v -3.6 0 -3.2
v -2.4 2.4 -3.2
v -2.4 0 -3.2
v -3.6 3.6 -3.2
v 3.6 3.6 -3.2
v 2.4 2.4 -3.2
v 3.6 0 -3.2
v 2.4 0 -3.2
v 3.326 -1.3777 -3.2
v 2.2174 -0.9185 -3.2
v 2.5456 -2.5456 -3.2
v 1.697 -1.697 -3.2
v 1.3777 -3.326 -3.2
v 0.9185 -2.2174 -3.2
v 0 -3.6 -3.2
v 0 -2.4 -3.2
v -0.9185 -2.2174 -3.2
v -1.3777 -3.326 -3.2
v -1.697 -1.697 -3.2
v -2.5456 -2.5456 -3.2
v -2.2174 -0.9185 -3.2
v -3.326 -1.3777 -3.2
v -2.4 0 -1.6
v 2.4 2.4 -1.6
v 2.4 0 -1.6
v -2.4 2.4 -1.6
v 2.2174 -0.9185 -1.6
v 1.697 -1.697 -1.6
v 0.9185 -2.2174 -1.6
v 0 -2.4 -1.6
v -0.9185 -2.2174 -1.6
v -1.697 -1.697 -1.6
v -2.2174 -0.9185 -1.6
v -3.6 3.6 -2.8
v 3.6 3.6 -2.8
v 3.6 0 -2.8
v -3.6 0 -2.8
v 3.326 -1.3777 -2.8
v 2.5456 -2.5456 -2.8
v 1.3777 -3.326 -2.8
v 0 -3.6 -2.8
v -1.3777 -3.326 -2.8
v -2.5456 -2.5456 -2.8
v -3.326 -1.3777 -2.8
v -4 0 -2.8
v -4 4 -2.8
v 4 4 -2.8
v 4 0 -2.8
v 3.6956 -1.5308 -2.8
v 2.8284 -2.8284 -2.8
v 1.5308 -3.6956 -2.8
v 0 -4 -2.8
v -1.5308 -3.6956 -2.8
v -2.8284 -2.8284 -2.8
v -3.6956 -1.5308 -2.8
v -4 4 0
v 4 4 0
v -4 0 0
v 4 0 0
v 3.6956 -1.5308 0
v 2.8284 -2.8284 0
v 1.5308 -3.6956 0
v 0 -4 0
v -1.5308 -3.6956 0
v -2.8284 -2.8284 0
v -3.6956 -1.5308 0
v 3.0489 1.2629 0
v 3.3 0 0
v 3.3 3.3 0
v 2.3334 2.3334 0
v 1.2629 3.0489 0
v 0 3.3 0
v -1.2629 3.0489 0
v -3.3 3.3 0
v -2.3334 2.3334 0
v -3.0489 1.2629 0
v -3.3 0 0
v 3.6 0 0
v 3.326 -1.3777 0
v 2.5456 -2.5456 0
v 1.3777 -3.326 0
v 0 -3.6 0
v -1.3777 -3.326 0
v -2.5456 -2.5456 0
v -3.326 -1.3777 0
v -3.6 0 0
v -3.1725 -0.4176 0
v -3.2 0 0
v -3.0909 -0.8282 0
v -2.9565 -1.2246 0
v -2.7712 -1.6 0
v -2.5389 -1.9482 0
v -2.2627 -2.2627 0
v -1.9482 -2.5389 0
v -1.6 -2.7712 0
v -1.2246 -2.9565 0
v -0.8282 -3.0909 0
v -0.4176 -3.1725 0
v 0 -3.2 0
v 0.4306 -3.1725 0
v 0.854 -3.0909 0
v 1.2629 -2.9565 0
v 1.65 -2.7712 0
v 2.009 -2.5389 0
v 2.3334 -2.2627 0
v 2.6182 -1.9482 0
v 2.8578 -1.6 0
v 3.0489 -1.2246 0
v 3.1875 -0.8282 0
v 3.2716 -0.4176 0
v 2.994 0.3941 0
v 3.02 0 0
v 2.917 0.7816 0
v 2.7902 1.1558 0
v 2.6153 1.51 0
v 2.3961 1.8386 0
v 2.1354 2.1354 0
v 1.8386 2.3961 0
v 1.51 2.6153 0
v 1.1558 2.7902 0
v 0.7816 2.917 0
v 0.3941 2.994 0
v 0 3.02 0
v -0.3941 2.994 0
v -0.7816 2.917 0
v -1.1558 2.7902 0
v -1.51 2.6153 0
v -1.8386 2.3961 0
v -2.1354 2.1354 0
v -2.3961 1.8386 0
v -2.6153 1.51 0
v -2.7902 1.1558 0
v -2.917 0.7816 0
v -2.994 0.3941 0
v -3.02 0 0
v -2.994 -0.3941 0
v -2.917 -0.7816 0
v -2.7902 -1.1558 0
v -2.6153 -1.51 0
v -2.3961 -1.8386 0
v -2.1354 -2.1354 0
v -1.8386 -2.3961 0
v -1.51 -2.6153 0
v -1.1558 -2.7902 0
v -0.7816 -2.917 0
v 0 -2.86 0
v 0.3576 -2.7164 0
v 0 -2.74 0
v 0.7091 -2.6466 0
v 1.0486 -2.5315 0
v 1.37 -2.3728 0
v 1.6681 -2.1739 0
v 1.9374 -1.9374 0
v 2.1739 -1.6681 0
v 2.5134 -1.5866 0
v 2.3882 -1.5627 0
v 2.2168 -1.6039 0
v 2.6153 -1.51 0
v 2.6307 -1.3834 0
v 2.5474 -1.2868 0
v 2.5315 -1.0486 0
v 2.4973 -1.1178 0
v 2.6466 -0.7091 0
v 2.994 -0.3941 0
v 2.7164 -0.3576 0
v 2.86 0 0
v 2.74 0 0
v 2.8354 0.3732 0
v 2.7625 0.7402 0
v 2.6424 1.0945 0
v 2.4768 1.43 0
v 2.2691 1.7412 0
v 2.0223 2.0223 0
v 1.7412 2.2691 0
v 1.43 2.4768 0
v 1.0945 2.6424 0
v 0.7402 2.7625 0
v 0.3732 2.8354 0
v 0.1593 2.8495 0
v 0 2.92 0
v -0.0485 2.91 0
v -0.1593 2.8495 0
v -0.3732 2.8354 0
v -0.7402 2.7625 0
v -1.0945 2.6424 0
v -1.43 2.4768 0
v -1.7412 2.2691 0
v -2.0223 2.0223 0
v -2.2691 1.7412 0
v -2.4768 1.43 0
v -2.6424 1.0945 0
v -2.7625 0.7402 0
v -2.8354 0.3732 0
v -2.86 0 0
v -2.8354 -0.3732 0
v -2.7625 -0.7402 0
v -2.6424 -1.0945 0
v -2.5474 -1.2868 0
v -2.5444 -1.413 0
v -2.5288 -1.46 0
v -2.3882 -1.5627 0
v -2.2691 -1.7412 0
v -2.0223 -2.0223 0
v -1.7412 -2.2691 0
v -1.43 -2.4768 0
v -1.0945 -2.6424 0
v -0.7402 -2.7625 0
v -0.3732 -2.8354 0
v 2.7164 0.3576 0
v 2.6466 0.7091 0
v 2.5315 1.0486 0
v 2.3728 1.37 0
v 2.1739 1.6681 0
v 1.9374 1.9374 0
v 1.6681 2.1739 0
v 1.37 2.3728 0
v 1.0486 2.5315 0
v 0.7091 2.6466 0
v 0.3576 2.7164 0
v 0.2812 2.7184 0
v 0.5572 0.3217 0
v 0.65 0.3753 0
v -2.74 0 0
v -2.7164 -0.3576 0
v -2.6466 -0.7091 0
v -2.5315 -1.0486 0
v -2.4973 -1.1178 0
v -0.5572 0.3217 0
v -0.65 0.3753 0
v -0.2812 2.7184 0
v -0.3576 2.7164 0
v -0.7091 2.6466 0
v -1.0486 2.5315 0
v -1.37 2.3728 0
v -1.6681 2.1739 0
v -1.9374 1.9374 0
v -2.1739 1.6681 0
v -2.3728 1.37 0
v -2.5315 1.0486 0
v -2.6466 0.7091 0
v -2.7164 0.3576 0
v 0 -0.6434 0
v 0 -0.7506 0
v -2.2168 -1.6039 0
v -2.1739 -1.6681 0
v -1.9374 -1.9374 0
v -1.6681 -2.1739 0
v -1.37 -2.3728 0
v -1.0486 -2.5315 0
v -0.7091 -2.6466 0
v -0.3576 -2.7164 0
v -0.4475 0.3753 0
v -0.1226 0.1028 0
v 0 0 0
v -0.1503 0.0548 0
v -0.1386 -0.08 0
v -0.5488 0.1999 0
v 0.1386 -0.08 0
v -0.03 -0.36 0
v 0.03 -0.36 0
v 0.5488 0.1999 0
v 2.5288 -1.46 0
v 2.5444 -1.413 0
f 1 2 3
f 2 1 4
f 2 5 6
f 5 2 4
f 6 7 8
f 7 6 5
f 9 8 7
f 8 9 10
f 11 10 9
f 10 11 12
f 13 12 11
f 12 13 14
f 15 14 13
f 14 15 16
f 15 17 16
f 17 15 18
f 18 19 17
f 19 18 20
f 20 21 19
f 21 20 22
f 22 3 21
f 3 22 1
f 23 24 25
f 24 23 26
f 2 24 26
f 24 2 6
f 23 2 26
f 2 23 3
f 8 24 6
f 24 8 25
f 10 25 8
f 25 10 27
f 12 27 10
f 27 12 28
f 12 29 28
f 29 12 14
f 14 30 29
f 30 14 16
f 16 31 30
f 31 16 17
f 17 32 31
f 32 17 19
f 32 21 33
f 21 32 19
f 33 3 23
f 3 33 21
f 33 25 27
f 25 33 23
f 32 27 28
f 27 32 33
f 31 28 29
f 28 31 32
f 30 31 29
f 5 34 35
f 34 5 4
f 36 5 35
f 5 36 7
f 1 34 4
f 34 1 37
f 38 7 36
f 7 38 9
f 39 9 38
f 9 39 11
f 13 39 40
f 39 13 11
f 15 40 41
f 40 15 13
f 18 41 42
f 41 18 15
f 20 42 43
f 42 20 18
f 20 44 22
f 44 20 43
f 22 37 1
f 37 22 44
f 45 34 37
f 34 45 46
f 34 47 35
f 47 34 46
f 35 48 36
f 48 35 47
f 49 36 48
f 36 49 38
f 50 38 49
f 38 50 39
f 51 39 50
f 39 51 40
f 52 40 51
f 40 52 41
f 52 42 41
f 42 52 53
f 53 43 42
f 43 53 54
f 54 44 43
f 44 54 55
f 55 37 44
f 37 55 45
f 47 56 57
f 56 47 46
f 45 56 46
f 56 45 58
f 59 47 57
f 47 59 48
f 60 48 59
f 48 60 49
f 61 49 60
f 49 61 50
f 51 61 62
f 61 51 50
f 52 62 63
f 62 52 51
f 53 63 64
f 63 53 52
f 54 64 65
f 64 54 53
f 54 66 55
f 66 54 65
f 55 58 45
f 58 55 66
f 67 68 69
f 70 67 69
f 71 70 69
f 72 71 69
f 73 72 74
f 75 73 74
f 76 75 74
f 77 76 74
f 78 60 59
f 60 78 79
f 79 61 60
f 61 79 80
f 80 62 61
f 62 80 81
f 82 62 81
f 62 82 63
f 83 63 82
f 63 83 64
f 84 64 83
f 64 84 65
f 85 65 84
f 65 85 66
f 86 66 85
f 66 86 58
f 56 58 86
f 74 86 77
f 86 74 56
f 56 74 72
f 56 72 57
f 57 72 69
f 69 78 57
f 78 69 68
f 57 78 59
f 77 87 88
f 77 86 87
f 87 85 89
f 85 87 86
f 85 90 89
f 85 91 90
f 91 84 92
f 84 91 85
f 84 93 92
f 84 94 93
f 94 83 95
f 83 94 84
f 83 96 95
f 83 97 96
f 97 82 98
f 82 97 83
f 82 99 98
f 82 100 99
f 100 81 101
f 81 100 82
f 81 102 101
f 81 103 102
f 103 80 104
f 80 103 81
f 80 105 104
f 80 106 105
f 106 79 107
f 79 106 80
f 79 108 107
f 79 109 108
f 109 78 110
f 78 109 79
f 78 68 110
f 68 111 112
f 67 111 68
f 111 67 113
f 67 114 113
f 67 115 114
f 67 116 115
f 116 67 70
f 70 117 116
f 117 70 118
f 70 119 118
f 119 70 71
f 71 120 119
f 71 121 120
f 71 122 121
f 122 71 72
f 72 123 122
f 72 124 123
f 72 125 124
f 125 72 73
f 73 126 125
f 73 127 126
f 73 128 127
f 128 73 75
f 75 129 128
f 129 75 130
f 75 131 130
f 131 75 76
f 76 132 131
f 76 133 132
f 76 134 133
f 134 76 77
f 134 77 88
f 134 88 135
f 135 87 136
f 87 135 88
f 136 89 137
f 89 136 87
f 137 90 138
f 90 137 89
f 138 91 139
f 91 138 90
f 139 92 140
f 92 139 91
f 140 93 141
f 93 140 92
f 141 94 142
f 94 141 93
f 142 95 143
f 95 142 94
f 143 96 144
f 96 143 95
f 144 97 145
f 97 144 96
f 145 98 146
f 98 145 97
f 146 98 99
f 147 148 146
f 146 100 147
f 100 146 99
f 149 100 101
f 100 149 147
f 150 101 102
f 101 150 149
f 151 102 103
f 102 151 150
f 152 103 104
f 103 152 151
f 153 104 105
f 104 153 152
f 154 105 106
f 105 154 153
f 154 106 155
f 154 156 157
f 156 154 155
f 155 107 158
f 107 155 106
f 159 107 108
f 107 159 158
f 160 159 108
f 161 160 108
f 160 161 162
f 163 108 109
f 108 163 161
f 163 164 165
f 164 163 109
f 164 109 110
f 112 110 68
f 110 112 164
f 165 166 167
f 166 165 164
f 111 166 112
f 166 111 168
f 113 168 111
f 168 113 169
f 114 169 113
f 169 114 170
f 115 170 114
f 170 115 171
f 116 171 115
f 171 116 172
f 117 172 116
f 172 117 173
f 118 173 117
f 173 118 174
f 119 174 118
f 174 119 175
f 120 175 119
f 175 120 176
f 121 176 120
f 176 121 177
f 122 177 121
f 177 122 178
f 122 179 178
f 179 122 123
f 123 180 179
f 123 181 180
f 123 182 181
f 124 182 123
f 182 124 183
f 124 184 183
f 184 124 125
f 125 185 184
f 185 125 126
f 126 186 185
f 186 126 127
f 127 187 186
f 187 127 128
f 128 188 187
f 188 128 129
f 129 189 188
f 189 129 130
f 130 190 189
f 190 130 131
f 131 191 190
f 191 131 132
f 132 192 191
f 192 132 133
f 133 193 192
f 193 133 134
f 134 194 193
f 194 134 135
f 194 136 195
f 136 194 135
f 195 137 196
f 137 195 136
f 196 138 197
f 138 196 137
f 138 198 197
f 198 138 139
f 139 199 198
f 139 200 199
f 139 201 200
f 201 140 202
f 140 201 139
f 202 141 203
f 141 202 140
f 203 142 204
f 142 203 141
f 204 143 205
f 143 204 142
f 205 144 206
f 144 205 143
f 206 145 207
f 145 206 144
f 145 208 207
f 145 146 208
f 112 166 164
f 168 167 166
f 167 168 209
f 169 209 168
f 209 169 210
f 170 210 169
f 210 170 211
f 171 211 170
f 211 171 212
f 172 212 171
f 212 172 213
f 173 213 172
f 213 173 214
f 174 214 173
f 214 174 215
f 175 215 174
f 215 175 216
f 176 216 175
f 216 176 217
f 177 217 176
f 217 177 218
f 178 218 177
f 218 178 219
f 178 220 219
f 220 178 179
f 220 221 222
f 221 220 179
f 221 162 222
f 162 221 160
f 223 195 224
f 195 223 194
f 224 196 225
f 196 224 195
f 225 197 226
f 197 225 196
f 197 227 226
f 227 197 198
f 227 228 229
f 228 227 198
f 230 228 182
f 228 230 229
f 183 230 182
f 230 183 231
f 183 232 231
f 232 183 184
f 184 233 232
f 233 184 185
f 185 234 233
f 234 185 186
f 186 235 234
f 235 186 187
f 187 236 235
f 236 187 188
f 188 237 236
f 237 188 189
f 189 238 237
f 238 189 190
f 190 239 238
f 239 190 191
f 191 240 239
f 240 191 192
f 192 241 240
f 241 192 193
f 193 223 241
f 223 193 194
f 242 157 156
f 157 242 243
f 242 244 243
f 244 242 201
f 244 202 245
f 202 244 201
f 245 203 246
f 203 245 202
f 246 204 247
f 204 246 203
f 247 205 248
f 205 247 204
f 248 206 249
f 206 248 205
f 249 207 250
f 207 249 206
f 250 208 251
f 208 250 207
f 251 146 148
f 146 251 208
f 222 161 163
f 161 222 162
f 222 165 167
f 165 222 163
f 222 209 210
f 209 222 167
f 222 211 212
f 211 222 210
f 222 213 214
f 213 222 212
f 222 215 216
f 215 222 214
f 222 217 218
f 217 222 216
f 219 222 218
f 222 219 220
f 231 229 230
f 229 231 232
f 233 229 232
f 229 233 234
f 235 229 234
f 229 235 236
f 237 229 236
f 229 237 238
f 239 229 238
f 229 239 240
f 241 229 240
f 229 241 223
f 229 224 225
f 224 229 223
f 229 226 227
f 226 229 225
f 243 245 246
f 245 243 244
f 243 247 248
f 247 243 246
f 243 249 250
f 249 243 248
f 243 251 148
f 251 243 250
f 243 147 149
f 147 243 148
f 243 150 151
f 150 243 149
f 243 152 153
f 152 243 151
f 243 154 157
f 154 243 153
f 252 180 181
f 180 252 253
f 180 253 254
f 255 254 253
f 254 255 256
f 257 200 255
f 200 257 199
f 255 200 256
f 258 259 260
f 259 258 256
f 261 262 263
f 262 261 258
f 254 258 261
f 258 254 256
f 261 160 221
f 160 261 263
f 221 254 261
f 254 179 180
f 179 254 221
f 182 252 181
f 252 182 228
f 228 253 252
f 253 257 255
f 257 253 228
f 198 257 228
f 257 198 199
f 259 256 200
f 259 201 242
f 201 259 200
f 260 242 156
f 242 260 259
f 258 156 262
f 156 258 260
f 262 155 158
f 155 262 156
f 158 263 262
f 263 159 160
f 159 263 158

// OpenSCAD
use <../lib.scad>
use <../p/2-4ering.scad>
use <../p/2-4ndis.scad>
use <../p/2-4ring9.scad>
use <s/24246s02.scad>
$fa=1; $fs=0.2;
function ldraw_lib__24246p04(realsolid=false) = [
// 0 Tile  1 x  1 with Rounded End with White Mercedes-Benz Logo Pattern
// 0 Name: 24246p04.dat
// 0 Author: Massimo Maso [Sirio]
// 0 !LDRAW_ORG Part UPDATE 2022-05
// 0 !LICENSE Licensed under CC BY 2.0 and CC BY 4.0 : see CAreadme.txt
// 
// 0 BFC CERTIFY CCW
  [0,"BFC","CERTIFY"],
  [0,"BFC","CCW"],
// 
// 0 !KEYWORDS F1, Mercedes, Set 76909, Speed Champions
// 
// 0 !HISTORY 2022-09-15 [PTadmin] Official Update 2022-05
// 
// 
// 0 // Subpart
// 1 16 0 0 0 1 0 0 0 1 0 0 0 1 s\24246s02.dat
  [1,16,0,0,0,1,0,0,0,1,0,0,0,1, ldraw_lib__s__24246s02(realsolid)],
// 0 // Upper face
// 0 // Primitives
// 1 15 0 0 0 8.25 0 0 0 1 0 0 0 8.25 2-4ering.dat
  [1,15,0,0,0,8.25,0,0,0,1,0,0,0,8.25, ldraw_lib__2_4ering(realsolid)],
// 1 16 0 0 0 8.25 0 0 0 1 0 0 0 8.25 2-4ndis.dat
  [1,16,0,0,0,8.25,0,0,0,1,0,0,0,8.25, ldraw_lib__2_4ndis(realsolid)],
// 1 16 0 0 0 9 0 0 0 1 0 0 0 -9 2-4ering.dat
  [1,16,0,0,0,9,0,0,0,1,0,0,0,-9, ldraw_lib__2_4ering(realsolid)],
// 1 16 0 0 0 1 0 0 0 1 0 0 0 -1 2-4ring9.dat
  [1,16,0,0,0,1,0,0,0,1,0,0,0,-1, ldraw_lib__2_4ring9(realsolid)],
// 0 // Neutral faces
// 3 16 -10 0 10 -10 0 0 -9 0 0
  [3,16,-10,0,10,-10,0,0,-9,0,0],
// 4 16 -10 0 10 -9 0 0 -8.25 0 0 -8.25 0 8.25
  [4,16,-10,0,10,-9,0,0,-8.25,0,0,-8.25,0,8.25],
// 3 16 -10 0 10 -8.25 0 8.25 0 0 8.25
  [3,16,-10,0,10,-8.25,0,8.25,0,0,8.25],
// 3 16 -10 0 10 0 0 8.25 10 0 10
  [3,16,-10,0,10,0,0,8.25,10,0,10],
// 3 16 10 0 10 0 0 8.25 8.25 0 8.25
  [3,16,10,0,10,0,0,8.25,8.25,0,8.25],
// 4 16 10 0 10 8.25 0 8.25 8.25 0 0 9 0 0
  [4,16,10,0,10,8.25,0,8.25,8.25,0,0,9,0,0],
// 3 16 10 0 10 9 0 0 10 0 0
  [3,16,10,0,10,9,0,0,10,0,0],
// 3 16 -8.25 0 0 -7.9312 0 -1.044 -8 0 0
  [3,16,-8.25,0,0,-7.9312,0,-1.044,-8,0,0],
// 3 16 -8.25 0 0 -9 0 0 -7.9312 0 -1.044
  [3,16,-8.25,0,0,-9,0,0,-7.9312,0,-1.044],
// 4 16 -8.3151 0 -3.4443 -7.7272 0 -2.0704 -7.9312 0 -1.044 -9 0 0
  [4,16,-8.3151,0,-3.4443,-7.7272,0,-2.0704,-7.9312,0,-1.044,-9,0,0],
// 3 16 -8.3151 0 -3.4443 -7.3912 0 -3.0616 -7.7272 0 -2.0704
  [3,16,-8.3151,0,-3.4443,-7.3912,0,-3.0616,-7.7272,0,-2.0704],
// 3 16 -8.3151 0 -3.4443 -6.928 0 -4 -7.3912 0 -3.0616
  [3,16,-8.3151,0,-3.4443,-6.928,0,-4,-7.3912,0,-3.0616],
// 4 16 -8.3151 0 -3.4443 -6.3639 0 -6.3639 -6.3472 0 -4.8704 -6.928 0 -4
  [4,16,-8.3151,0,-3.4443,-6.3639,0,-6.3639,-6.3472,0,-4.8704,-6.928,0,-4],
// 3 16 -6.3639 0 -6.3639 -5.6568 0 -5.6568 -6.3472 0 -4.8704
  [3,16,-6.3639,0,-6.3639,-5.6568,0,-5.6568,-6.3472,0,-4.8704],
// 3 16 -6.3639 0 -6.3639 -4.8704 0 -6.3472 -5.6568 0 -5.6568
  [3,16,-6.3639,0,-6.3639,-4.8704,0,-6.3472,-5.6568,0,-5.6568],
// 4 16 -3.4443 0 -8.3151 -4 0 -6.928 -4.8704 0 -6.3472 -6.3639 0 -6.3639
  [4,16,-3.4443,0,-8.3151,-4,0,-6.928,-4.8704,0,-6.3472,-6.3639,0,-6.3639],
// 3 16 -3.4443 0 -8.3151 -3.0616 0 -7.3912 -4 0 -6.928
  [3,16,-3.4443,0,-8.3151,-3.0616,0,-7.3912,-4,0,-6.928],
// 3 16 -3.4443 0 -8.3151 -2.0704 0 -7.7272 -3.0616 0 -7.3912
  [3,16,-3.4443,0,-8.3151,-2.0704,0,-7.7272,-3.0616,0,-7.3912],
// 4 16 0 0 -9 -1.044 0 -7.9312 -2.0704 0 -7.7272 -3.4443 0 -8.3151
  [4,16,0,0,-9,-1.044,0,-7.9312,-2.0704,0,-7.7272,-3.4443,0,-8.3151],
// 3 16 0 0 -9 0 0 -8 -1.044 0 -7.9312
  [3,16,0,0,-9,0,0,-8,-1.044,0,-7.9312],
// 3 16 0 0 -9 1.0766 0 -7.9312 0 0 -8
  [3,16,0,0,-9,1.0766,0,-7.9312,0,0,-8],
// 4 16 0 0 -9 3.4443 0 -8.3151 2.1351 0 -7.7272 1.0766 0 -7.9312
  [4,16,0,0,-9,3.4443,0,-8.3151,2.1351,0,-7.7272,1.0766,0,-7.9312],
// 3 16 3.4443 0 -8.3151 3.1573 0 -7.3912 2.1351 0 -7.7272
  [3,16,3.4443,0,-8.3151,3.1573,0,-7.3912,2.1351,0,-7.7272],
// 3 16 3.4443 0 -8.3151 4.125 0 -6.928 3.1573 0 -7.3912
  [3,16,3.4443,0,-8.3151,4.125,0,-6.928,3.1573,0,-7.3912],
// 4 16 3.4443 0 -8.3151 6.3639 0 -6.3639 5.0226 0 -6.3472 4.125 0 -6.928
  [4,16,3.4443,0,-8.3151,6.3639,0,-6.3639,5.0226,0,-6.3472,4.125,0,-6.928],
// 3 16 6.3639 0 -6.3639 5.8336 0 -5.6568 5.0226 0 -6.3472
  [3,16,6.3639,0,-6.3639,5.8336,0,-5.6568,5.0226,0,-6.3472],
// 3 16 6.3639 0 -6.3639 6.5456 0 -4.8704 5.8336 0 -5.6568
  [3,16,6.3639,0,-6.3639,6.5456,0,-4.8704,5.8336,0,-5.6568],
// 4 16 8.3151 0 -3.4443 7.1445 0 -4 6.5456 0 -4.8704 6.3639 0 -6.3639
  [4,16,8.3151,0,-3.4443,7.1445,0,-4,6.5456,0,-4.8704,6.3639,0,-6.3639],
// 3 16 8.3151 0 -3.4443 7.6222 0 -3.0616 7.1445 0 -4
  [3,16,8.3151,0,-3.4443,7.6222,0,-3.0616,7.1445,0,-4],
// 3 16 8.3151 0 -3.4443 7.9687 0 -2.0704 7.6222 0 -3.0616
  [3,16,8.3151,0,-3.4443,7.9687,0,-2.0704,7.6222,0,-3.0616],
// 4 16 8.3151 0 -3.4443 9 0 0 8.1791 0 -1.044 7.9687 0 -2.0704
  [4,16,8.3151,0,-3.4443,9,0,0,8.1791,0,-1.044,7.9687,0,-2.0704],
// 3 16 9 0 0 8.25 0 0 8.1791 0 -1.044
  [3,16,9,0,0,8.25,0,0,8.1791,0,-1.044],
// 
// 0 // White outer ring
// 3 15 8.25 0 0 7.4851 0 .9853 7.55 0 0
  [3,15,8.25,0,0,7.4851,0,.9853,7.55,0,0],
// 4 15 8.25 0 0 7.6222 0 3.1573 7.2925 0 1.9539 7.4851 0 .9853
  [4,15,8.25,0,0,7.6222,0,3.1573,7.2925,0,1.9539,7.4851,0,.9853],
// 3 15 7.6222 0 3.1573 6.9754 0 2.8894 7.2925 0 1.9539
  [3,15,7.6222,0,3.1573,6.9754,0,2.8894,7.2925,0,1.9539],
// 3 15 7.6222 0 3.1573 6.5383 0 3.775 6.9754 0 2.8894
  [3,15,7.6222,0,3.1573,6.5383,0,3.775,6.9754,0,2.8894],
// 4 15 5.8336 0 5.8336 5.9902 0 4.5964 6.5383 0 3.775 7.6222 0 3.1573
  [4,15,5.8336,0,5.8336,5.9902,0,4.5964,6.5383,0,3.775,7.6222,0,3.1573],
// 3 15 5.8336 0 5.8336 5.3386 0 5.3386 5.9902 0 4.5964
  [3,15,5.8336,0,5.8336,5.3386,0,5.3386,5.9902,0,4.5964],
// 3 15 5.3386 0 5.3386 5.8336 0 5.8336 4.5964 0 5.9902
  [3,15,5.3386,0,5.3386,5.8336,0,5.8336,4.5964,0,5.9902],
// 4 15 5.8336 0 5.8336 3.1573 0 7.6222 3.775 0 6.5383 4.5964 0 5.9902
  [4,15,5.8336,0,5.8336,3.1573,0,7.6222,3.775,0,6.5383,4.5964,0,5.9902],
// 3 15 3.1573 0 7.6222 2.8894 0 6.9754 3.775 0 6.5383
  [3,15,3.1573,0,7.6222,2.8894,0,6.9754,3.775,0,6.5383],
// 3 15 3.1573 0 7.6222 1.9539 0 7.2925 2.8894 0 6.9754
  [3,15,3.1573,0,7.6222,1.9539,0,7.2925,2.8894,0,6.9754],
// 4 15 0 0 8.25 .9853 0 7.4851 1.9539 0 7.2925 3.1573 0 7.6222
  [4,15,0,0,8.25,.9853,0,7.4851,1.9539,0,7.2925,3.1573,0,7.6222],
// 3 15 0 0 8.25 0 0 7.55 .9853 0 7.4851
  [3,15,0,0,8.25,0,0,7.55,.9853,0,7.4851],
// 3 15 0 0 8.25 -.9853 0 7.4851 0 0 7.55
  [3,15,0,0,8.25,-.9853,0,7.4851,0,0,7.55],
// 4 15 0 0 8.25 -3.1573 0 7.6222 -1.9539 0 7.2925 -.9853 0 7.4851
  [4,15,0,0,8.25,-3.1573,0,7.6222,-1.9539,0,7.2925,-.9853,0,7.4851],
// 3 15 -3.1573 0 7.6222 -2.8894 0 6.9754 -1.9539 0 7.2925
  [3,15,-3.1573,0,7.6222,-2.8894,0,6.9754,-1.9539,0,7.2925],
// 3 15 -3.1573 0 7.6222 -3.775 0 6.5383 -2.8894 0 6.9754
  [3,15,-3.1573,0,7.6222,-3.775,0,6.5383,-2.8894,0,6.9754],
// 4 15 -5.8336 0 5.8336 -4.5964 0 5.9902 -3.775 0 6.5383 -3.1573 0 7.6222
  [4,15,-5.8336,0,5.8336,-4.5964,0,5.9902,-3.775,0,6.5383,-3.1573,0,7.6222],
// 3 15 -5.8336 0 5.8336 -5.3386 0 5.3386 -4.5964 0 5.9902
  [3,15,-5.8336,0,5.8336,-5.3386,0,5.3386,-4.5964,0,5.9902],
// 3 15 -5.3386 0 5.3386 -5.8336 0 5.8336 -5.9902 0 4.5964
  [3,15,-5.3386,0,5.3386,-5.8336,0,5.8336,-5.9902,0,4.5964],
// 4 15 -5.8336 0 5.8336 -7.6222 0 3.1573 -6.5383 0 3.775 -5.9902 0 4.5964
  [4,15,-5.8336,0,5.8336,-7.6222,0,3.1573,-6.5383,0,3.775,-5.9902,0,4.5964],
// 3 15 -7.6222 0 3.1573 -6.9754 0 2.8894 -6.5383 0 3.775
  [3,15,-7.6222,0,3.1573,-6.9754,0,2.8894,-6.5383,0,3.775],
// 3 15 -7.6222 0 3.1573 -7.2925 0 1.9539 -6.9754 0 2.8894
  [3,15,-7.6222,0,3.1573,-7.2925,0,1.9539,-6.9754,0,2.8894],
// 4 15 -8.25 0 0 -7.4851 0 .9853 -7.2925 0 1.9539 -7.6222 0 3.1573
  [4,15,-8.25,0,0,-7.4851,0,.9853,-7.2925,0,1.9539,-7.6222,0,3.1573],
// 3 15 -7.4851 0 .9853 -8.25 0 0 -8 0 0
  [3,15,-7.4851,0,.9853,-8.25,0,0,-8,0,0],
// 3 15 -7.4851 0 .9853 -8 0 0 -7.55 0 0
  [3,15,-7.4851,0,.9853,-8,0,0,-7.55,0,0],
// 4 15 -7.4851 0 -.9853 -7.55 0 0 -8 0 0 -7.9312 0 -1.044
  [4,15,-7.4851,0,-.9853,-7.55,0,0,-8,0,0,-7.9312,0,-1.044],
// 4 15 -7.4851 0 -.9853 -7.9312 0 -1.044 -7.7272 0 -2.0704 -7.2925 0 -1.9539
  [4,15,-7.4851,0,-.9853,-7.9312,0,-1.044,-7.7272,0,-2.0704,-7.2925,0,-1.9539],
// 4 15 -6.9754 0 -2.8894 -7.2925 0 -1.9539 -7.7272 0 -2.0704 -7.3912 0 -3.0616
  [4,15,-6.9754,0,-2.8894,-7.2925,0,-1.9539,-7.7272,0,-2.0704,-7.3912,0,-3.0616],
// 4 15 -6.9754 0 -2.8894 -7.3912 0 -3.0616 -6.928 0 -4 -6.5383 0 -3.775
  [4,15,-6.9754,0,-2.8894,-7.3912,0,-3.0616,-6.928,0,-4,-6.5383,0,-3.775],
// 4 15 -5.9902 0 -4.5964 -6.5383 0 -3.775 -6.928 0 -4 -6.3472 0 -4.8704
  [4,15,-5.9902,0,-4.5964,-6.5383,0,-3.775,-6.928,0,-4,-6.3472,0,-4.8704],
// 4 15 -5.9902 0 -4.5964 -6.3472 0 -4.8704 -5.6568 0 -5.6568 -5.3386 0 -5.3386
  [4,15,-5.9902,0,-4.5964,-6.3472,0,-4.8704,-5.6568,0,-5.6568,-5.3386,0,-5.3386],
// 4 15 -4.5964 0 -5.9902 -5.3386 0 -5.3386 -5.6568 0 -5.6568 -4.8704 0 -6.3472
  [4,15,-4.5964,0,-5.9902,-5.3386,0,-5.3386,-5.6568,0,-5.6568,-4.8704,0,-6.3472],
// 4 15 -4.5964 0 -5.9902 -4.8704 0 -6.3472 -4 0 -6.928 -3.775 0 -6.5383
  [4,15,-4.5964,0,-5.9902,-4.8704,0,-6.3472,-4,0,-6.928,-3.775,0,-6.5383],
// 4 15 -2.8894 0 -6.9754 -3.775 0 -6.5383 -4 0 -6.928 -3.0616 0 -7.3912
  [4,15,-2.8894,0,-6.9754,-3.775,0,-6.5383,-4,0,-6.928,-3.0616,0,-7.3912],
// 4 15 -2.8894 0 -6.9754 -3.0616 0 -7.3912 -2.0704 0 -7.7272 -1.9539 0 -7.2925
  [4,15,-2.8894,0,-6.9754,-3.0616,0,-7.3912,-2.0704,0,-7.7272,-1.9539,0,-7.2925],
// 4 15 0 0 -7.15 -1.9539 0 -7.2925 -2.0704 0 -7.7272 -1.044 0 -7.9312
  [4,15,0,0,-7.15,-1.9539,0,-7.2925,-2.0704,0,-7.7272,-1.044,0,-7.9312],
// 3 15 0 0 -7.15 -1.044 0 -7.9312 0 0 -8
  [3,15,0,0,-7.15,-1.044,0,-7.9312,0,0,-8],
// 3 15 .8939 0 -6.7911 0 0 -6.85 0 0 -7.15
  [3,15,.8939,0,-6.7911,0,0,-6.85,0,0,-7.15],
// 4 15 .8939 0 -6.7911 0 0 -7.15 0 0 -8 1.0766 0 -7.9312
  [4,15,.8939,0,-6.7911,0,0,-7.15,0,0,-8,1.0766,0,-7.9312],
// 4 15 .8939 0 -6.7911 1.0766 0 -7.9312 2.1351 0 -7.7272 1.7728 0 -6.6164
  [4,15,.8939,0,-6.7911,1.0766,0,-7.9312,2.1351,0,-7.7272,1.7728,0,-6.6164],
// 4 15 2.6215 0 -6.3287 1.7728 0 -6.6164 2.1351 0 -7.7272 3.1573 0 -7.3912
  [4,15,2.6215,0,-6.3287,1.7728,0,-6.6164,2.1351,0,-7.7272,3.1573,0,-7.3912],
// 4 15 2.6215 0 -6.3287 3.1573 0 -7.3912 4.125 0 -6.928 3.425 0 -5.9321
  [4,15,2.6215,0,-6.3287,3.1573,0,-7.3912,4.125,0,-6.928,3.425,0,-5.9321],
// 4 15 4.1703 0 -5.4348 3.425 0 -5.9321 4.125 0 -6.928 5.0226 0 -6.3472
  [4,15,4.1703,0,-5.4348,3.425,0,-5.9321,4.125,0,-6.928,5.0226,0,-6.3472],
// 4 15 4.1703 0 -5.4348 5.0226 0 -6.3472 5.8336 0 -5.6568 4.8436 0 -4.8436
  [4,15,4.1703,0,-5.4348,5.0226,0,-6.3472,5.8336,0,-5.6568,4.8436,0,-4.8436],
// 4 15 5.4348 0 -4.1703 4.8436 0 -4.8436 5.8336 0 -5.6568 6.5456 0 -4.8704
  [4,15,5.4348,0,-4.1703,4.8436,0,-4.8436,5.8336,0,-5.6568,6.5456,0,-4.8704],
// 3 15 5.4348 0 -4.1703 6.5456 0 -4.8704 6.2835 0 -3.9664
  [3,15,5.4348,0,-4.1703,6.5456,0,-4.8704,6.2835,0,-3.9664],
// 4 15 5.4348 0 -4.1703 6.2835 0 -3.9664 5.9705 0 -3.9068 5.5419 0 -4.0097
  [4,15,5.4348,0,-4.1703,6.2835,0,-3.9664,5.9705,0,-3.9068,5.5419,0,-4.0097],
// 4 15 6.5383 0 -3.775 6.2835 0 -3.9664 6.5456 0 -4.8704 7.1445 0 -4
  [4,15,6.5383,0,-3.775,6.2835,0,-3.9664,6.5456,0,-4.8704,7.1445,0,-4],
// 4 15 6.5383 0 -3.775 7.1445 0 -4 7.6222 0 -3.0616 6.5768 0 -3.4585
  [4,15,6.5383,0,-3.775,7.1445,0,-4,7.6222,0,-3.0616,6.5768,0,-3.4585],
// 3 15 6.3686 0 -3.2171 6.5768 0 -3.4585 7.6222 0 -3.0616
  [3,15,6.3686,0,-3.2171,6.5768,0,-3.4585,7.6222,0,-3.0616],
// 4 15 6.3686 0 -3.2171 7.6222 0 -3.0616 6.3287 0 -2.6215 6.2433 0 -2.7945
  [4,15,6.3686,0,-3.2171,7.6222,0,-3.0616,6.3287,0,-2.6215,6.2433,0,-2.7945],
// 4 15 6.6164 0 -1.7728 6.3287 0 -2.6215 7.6222 0 -3.0616 7.9687 0 -2.0704
  [4,15,6.6164,0,-1.7728,6.3287,0,-2.6215,7.6222,0,-3.0616,7.9687,0,-2.0704],
// 4 15 6.6164 0 -1.7728 7.9687 0 -2.0704 7.4851 0 -.9853 6.7911 0 -.8939
  [4,15,6.6164,0,-1.7728,7.9687,0,-2.0704,7.4851,0,-.9853,6.7911,0,-.8939],
// 3 15 7.4851 0 -.9853 7.9687 0 -2.0704 8.1791 0 -1.044
  [3,15,7.4851,0,-.9853,7.9687,0,-2.0704,8.1791,0,-1.044],
// 4 15 7.4851 0 -.9853 8.1791 0 -1.044 8.25 0 0 7.55 0 0
  [4,15,7.4851,0,-.9853,8.1791,0,-1.044,8.25,0,0,7.55,0,0],
// 4 15 7.4851 0 -.9853 7.15 0 0 6.85 0 0 6.7911 0 -.8939
  [4,15,7.4851,0,-.9853,7.15,0,0,6.85,0,0,6.7911,0,-.8939],
// 0 // Neutral ring
// 4 16 7.55 0 0 7.4851 0 .9853 7.0885 0 .9331 7.15 0 0
  [4,16,7.55,0,0,7.4851,0,.9853,7.0885,0,.9331,7.15,0,0],
// 4 16 7.2925 0 1.9539 6.9062 0 1.8504 7.0885 0 .9331 7.4851 0 .9853
  [4,16,7.2925,0,1.9539,6.9062,0,1.8504,7.0885,0,.9331,7.4851,0,.9853],
// 4 16 7.2925 0 1.9539 6.9754 0 2.8894 6.6059 0 2.7363 6.9062 0 1.8504
  [4,16,7.2925,0,1.9539,6.9754,0,2.8894,6.6059,0,2.7363,6.9062,0,1.8504],
// 4 16 6.5383 0 3.775 6.1919 0 3.575 6.6059 0 2.7363 6.9754 0 2.8894
  [4,16,6.5383,0,3.775,6.1919,0,3.575,6.6059,0,2.7363,6.9754,0,2.8894],
// 4 16 6.5383 0 3.775 5.9902 0 4.5964 5.6728 0 4.3529 6.1919 0 3.575
  [4,16,6.5383,0,3.775,5.9902,0,4.5964,5.6728,0,4.3529,6.1919,0,3.575],
// 4 16 5.3386 0 5.3386 5.0558 0 5.0558 5.6728 0 4.3529 5.9902 0 4.5964
  [4,16,5.3386,0,5.3386,5.0558,0,5.0558,5.6728,0,4.3529,5.9902,0,4.5964],
// 4 16 5.3386 0 5.3386 4.5964 0 5.9902 4.3529 0 5.6728 5.0558 0 5.0558
  [4,16,5.3386,0,5.3386,4.5964,0,5.9902,4.3529,0,5.6728,5.0558,0,5.0558],
// 4 16 3.775 0 6.5383 3.575 0 6.1919 4.3529 0 5.6728 4.5964 0 5.9902
  [4,16,3.775,0,6.5383,3.575,0,6.1919,4.3529,0,5.6728,4.5964,0,5.9902],
// 4 16 3.775 0 6.5383 2.8894 0 6.9754 2.7363 0 6.6059 3.575 0 6.1919
  [4,16,3.775,0,6.5383,2.8894,0,6.9754,2.7363,0,6.6059,3.575,0,6.1919],
// 4 16 1.9539 0 7.2925 1.8504 0 6.9062 2.7363 0 6.6059 2.8894 0 6.9754
  [4,16,1.9539,0,7.2925,1.8504,0,6.9062,2.7363,0,6.6059,2.8894,0,6.9754],
// 4 16 1.9539 0 7.2925 .9853 0 7.4851 .9331 0 7.0885 1.8504 0 6.9062
  [4,16,1.9539,0,7.2925,.9853,0,7.4851,.9331,0,7.0885,1.8504,0,6.9062],
// 4 16 0 0 7.55 .3982 0 7.1238 .9331 0 7.0885 .9853 0 7.4851
  [4,16,0,0,7.55,.3982,0,7.1238,.9331,0,7.0885,.9853,0,7.4851],
// 3 16 0 0 7.55 0 0 7.3 .3982 0 7.1238
  [3,16,0,0,7.55,0,0,7.3,.3982,0,7.1238],
// 3 16 0 0 7.55 -.1213 0 7.275 0 0 7.3
  [3,16,0,0,7.55,-.1213,0,7.275,0,0,7.3],
// 3 16 0 0 7.55 -.3982 0 7.1238 -.1213 0 7.275
  [3,16,0,0,7.55,-.3982,0,7.1238,-.1213,0,7.275],
// 4 16 0 0 7.55 -.9853 0 7.4851 -.9331 0 7.0885 -.3982 0 7.1238
  [4,16,0,0,7.55,-.9853,0,7.4851,-.9331,0,7.0885,-.3982,0,7.1238],
// 4 16 -1.9539 0 7.2925 -1.8504 0 6.9062 -.9331 0 7.0885 -.9853 0 7.4851
  [4,16,-1.9539,0,7.2925,-1.8504,0,6.9062,-.9331,0,7.0885,-.9853,0,7.4851],
// 4 16 -1.9539 0 7.2925 -2.8894 0 6.9754 -2.7363 0 6.6059 -1.8504 0 6.9062
  [4,16,-1.9539,0,7.2925,-2.8894,0,6.9754,-2.7363,0,6.6059,-1.8504,0,6.9062],
// 4 16 -3.775 0 6.5383 -3.575 0 6.1919 -2.7363 0 6.6059 -2.8894 0 6.9754
  [4,16,-3.775,0,6.5383,-3.575,0,6.1919,-2.7363,0,6.6059,-2.8894,0,6.9754],
// 4 16 -3.775 0 6.5383 -4.5964 0 5.9902 -4.3529 0 5.6728 -3.575 0 6.1919
  [4,16,-3.775,0,6.5383,-4.5964,0,5.9902,-4.3529,0,5.6728,-3.575,0,6.1919],
// 4 16 -5.3386 0 5.3386 -5.0558 0 5.0558 -4.3529 0 5.6728 -4.5964 0 5.9902
  [4,16,-5.3386,0,5.3386,-5.0558,0,5.0558,-4.3529,0,5.6728,-4.5964,0,5.9902],
// 4 16 -5.3386 0 5.3386 -5.9902 0 4.5964 -5.6728 0 4.3529 -5.0558 0 5.0558
  [4,16,-5.3386,0,5.3386,-5.9902,0,4.5964,-5.6728,0,4.3529,-5.0558,0,5.0558],
// 4 16 -6.5383 0 3.775 -6.1919 0 3.575 -5.6728 0 4.3529 -5.9902 0 4.5964
  [4,16,-6.5383,0,3.775,-6.1919,0,3.575,-5.6728,0,4.3529,-5.9902,0,4.5964],
// 4 16 -6.5383 0 3.775 -6.9754 0 2.8894 -6.6059 0 2.7363 -6.1919 0 3.575
  [4,16,-6.5383,0,3.775,-6.9754,0,2.8894,-6.6059,0,2.7363,-6.1919,0,3.575],
// 4 16 -7.2925 0 1.9539 -6.9062 0 1.8504 -6.6059 0 2.7363 -6.9754 0 2.8894
  [4,16,-7.2925,0,1.9539,-6.9062,0,1.8504,-6.6059,0,2.7363,-6.9754,0,2.8894],
// 4 16 -7.2925 0 1.9539 -7.4851 0 .9853 -7.0885 0 .9331 -6.9062 0 1.8504
  [4,16,-7.2925,0,1.9539,-7.4851,0,.9853,-7.0885,0,.9331,-6.9062,0,1.8504],
// 4 16 -7.55 0 0 -7.15 0 0 -7.0885 0 .9331 -7.4851 0 .9853
  [4,16,-7.55,0,0,-7.15,0,0,-7.0885,0,.9331,-7.4851,0,.9853],
// 4 16 -7.55 0 0 -7.4851 0 -.9853 -7.0885 0 -.9331 -7.15 0 0
  [4,16,-7.55,0,0,-7.4851,0,-.9853,-7.0885,0,-.9331,-7.15,0,0],
// 4 16 -7.2925 0 -1.9539 -6.9062 0 -1.8504 -7.0885 0 -.9331 -7.4851 0 -.9853
  [4,16,-7.2925,0,-1.9539,-6.9062,0,-1.8504,-7.0885,0,-.9331,-7.4851,0,-.9853],
// 4 16 -7.2925 0 -1.9539 -6.9754 0 -2.8894 -6.6059 0 -2.7363 -6.9062 0 -1.8504
  [4,16,-7.2925,0,-1.9539,-6.9754,0,-2.8894,-6.6059,0,-2.7363,-6.9062,0,-1.8504],
// 4 16 -6.5383 0 -3.775 -6.3686 0 -3.2171 -6.6059 0 -2.7363 -6.9754 0 -2.8894
  [4,16,-6.5383,0,-3.775,-6.3686,0,-3.2171,-6.6059,0,-2.7363,-6.9754,0,-2.8894],
// 3 16 -6.5383 0 -3.775 -6.361 0 -3.5325 -6.3686 0 -3.2171
  [3,16,-6.5383,0,-3.775,-6.361,0,-3.5325,-6.3686,0,-3.2171],
// 3 16 -6.5383 0 -3.775 -6.322 0 -3.65 -6.361 0 -3.5325
  [3,16,-6.5383,0,-3.775,-6.322,0,-3.65,-6.361,0,-3.5325],
// 3 16 -6.5383 0 -3.775 -5.9705 0 -3.9068 -6.322 0 -3.65
  [3,16,-6.5383,0,-3.775,-5.9705,0,-3.9068,-6.322,0,-3.65],
// 4 16 -6.5383 0 -3.775 -5.9902 0 -4.5964 -5.6728 0 -4.3529 -5.9705 0 -3.9068
  [4,16,-6.5383,0,-3.775,-5.9902,0,-4.5964,-5.6728,0,-4.3529,-5.9705,0,-3.9068],
// 4 16 -5.3386 0 -5.3386 -5.0558 0 -5.0558 -5.6728 0 -4.3529 -5.9902 0 -4.5964
  [4,16,-5.3386,0,-5.3386,-5.0558,0,-5.0558,-5.6728,0,-4.3529,-5.9902,0,-4.5964],
// 4 16 -5.3386 0 -5.3386 -4.5964 0 -5.9902 -4.3529 0 -5.6728 -5.0558 0 -5.0558
  [4,16,-5.3386,0,-5.3386,-4.5964,0,-5.9902,-4.3529,0,-5.6728,-5.0558,0,-5.0558],
// 4 16 -3.775 0 -6.5383 -3.575 0 -6.1919 -4.3529 0 -5.6728 -4.5964 0 -5.9902
  [4,16,-3.775,0,-6.5383,-3.575,0,-6.1919,-4.3529,0,-5.6728,-4.5964,0,-5.9902],
// 4 16 -3.775 0 -6.5383 -2.8894 0 -6.9754 -2.7363 0 -6.6059 -3.575 0 -6.1919
  [4,16,-3.775,0,-6.5383,-2.8894,0,-6.9754,-2.7363,0,-6.6059,-3.575,0,-6.1919],
// 4 16 -1.9539 0 -7.2925 -1.8504 0 -6.9062 -2.7363 0 -6.6059 -2.8894 0 -6.9754
  [4,16,-1.9539,0,-7.2925,-1.8504,0,-6.9062,-2.7363,0,-6.6059,-2.8894,0,-6.9754],
// 3 16 -1.9539 0 -7.2925 -.9331 0 -7.0885 -1.8504 0 -6.9062
  [3,16,-1.9539,0,-7.2925,-.9331,0,-7.0885,-1.8504,0,-6.9062],
// 3 16 -1.9539 0 -7.2925 0 0 -7.15 -.9331 0 -7.0885
  [3,16,-1.9539,0,-7.2925,0,0,-7.15,-.9331,0,-7.0885],
// 3 16 7.55 0 0 7.15 0 0 7.4851 0 -.9853
  [3,16,7.55,0,0,7.15,0,0,7.4851,0,-.9853],
// 0 // White inner ring
// 4 15 7.15 0 0 7.0885 0 .9331 6.7911 0 .8939 6.85 0 0
  [4,15,7.15,0,0,7.0885,0,.9331,6.7911,0,.8939,6.85,0,0],
// 4 15 6.9062 0 1.8504 6.6164 0 1.7728 6.7911 0 .8939 7.0885 0 .9331
  [4,15,6.9062,0,1.8504,6.6164,0,1.7728,6.7911,0,.8939,7.0885,0,.9331],
// 4 15 6.9062 0 1.8504 6.6059 0 2.7363 6.3287 0 2.6215 6.6164 0 1.7728
  [4,15,6.9062,0,1.8504,6.6059,0,2.7363,6.3287,0,2.6215,6.6164,0,1.7728],
// 4 15 6.1919 0 3.575 5.9321 0 3.425 6.3287 0 2.6215 6.6059 0 2.7363
  [4,15,6.1919,0,3.575,5.9321,0,3.425,6.3287,0,2.6215,6.6059,0,2.7363],
// 4 15 6.1919 0 3.575 5.6728 0 4.3529 5.4348 0 4.1703 5.9321 0 3.425
  [4,15,6.1919,0,3.575,5.6728,0,4.3529,5.4348,0,4.1703,5.9321,0,3.425],
// 4 15 5.0558 0 5.0558 4.8436 0 4.8436 5.4348 0 4.1703 5.6728 0 4.3529
  [4,15,5.0558,0,5.0558,4.8436,0,4.8436,5.4348,0,4.1703,5.6728,0,4.3529],
// 4 15 5.0558 0 5.0558 4.3529 0 5.6728 4.1703 0 5.4348 4.8436 0 4.8436
  [4,15,5.0558,0,5.0558,4.3529,0,5.6728,4.1703,0,5.4348,4.8436,0,4.8436],
// 4 15 3.575 0 6.1919 3.425 0 5.9321 4.1703 0 5.4348 4.3529 0 5.6728
  [4,15,3.575,0,6.1919,3.425,0,5.9321,4.1703,0,5.4348,4.3529,0,5.6728],
// 4 15 3.575 0 6.1919 2.7363 0 6.6059 2.6215 0 6.3287 3.425 0 5.9321
  [4,15,3.575,0,6.1919,2.7363,0,6.6059,2.6215,0,6.3287,3.425,0,5.9321],
// 4 15 1.8504 0 6.9062 1.7728 0 6.6164 2.6215 0 6.3287 2.7363 0 6.6059
  [4,15,1.8504,0,6.9062,1.7728,0,6.6164,2.6215,0,6.3287,2.7363,0,6.6059],
// 4 15 1.8504 0 6.9062 .9331 0 7.0885 .8939 0 6.7911 1.7728 0 6.6164
  [4,15,1.8504,0,6.9062,.9331,0,7.0885,.8939,0,6.7911,1.7728,0,6.6164],
// 4 15 .3982 0 7.1238 .7029 0 6.796 .8939 0 6.7911 .9331 0 7.0885
  [4,15,.3982,0,7.1238,.7029,0,6.796,.8939,0,6.7911,.9331,0,7.0885],
// 4 15 .3982 0 7.1238 1.393 0 .8043 1.625 0 .9382 .7029 0 6.796
  [4,15,.3982,0,7.1238,1.393,0,.8043,1.625,0,.9382,.7029,0,6.796],
// 4 15 6.3686 0 -3.2171 6.2433 0 -2.7945 1.625 0 .9382 1.393 0 .8043
  [4,15,6.3686,0,-3.2171,6.2433,0,-2.7945,1.625,0,.9382,1.393,0,.8043],
// 4 15 -7.15 0 0 -7.0885 0 -.9331 -6.7911 0 -.8939 -6.85 0 0
  [4,15,-7.15,0,0,-7.0885,0,-.9331,-6.7911,0,-.8939,-6.85,0,0],
// 4 15 -6.9062 0 -1.8504 -6.6164 0 -1.7728 -6.7911 0 -.8939 -7.0885 0 -.9331
  [4,15,-6.9062,0,-1.8504,-6.6164,0,-1.7728,-6.7911,0,-.8939,-7.0885,0,-.9331],
// 4 15 -6.9062 0 -1.8504 -6.6059 0 -2.7363 -6.3287 0 -2.6215 -6.6164 0 -1.7728
  [4,15,-6.9062,0,-1.8504,-6.6059,0,-2.7363,-6.3287,0,-2.6215,-6.6164,0,-1.7728],
// 4 15 -6.3686 0 -3.2171 -6.2433 0 -2.7945 -6.3287 0 -2.6215 -6.6059 0 -2.7363
  [4,15,-6.3686,0,-3.2171,-6.2433,0,-2.7945,-6.3287,0,-2.6215,-6.6059,0,-2.7363],
// 4 15 -6.3686 0 -3.2171 -1.393 0 .8043 -1.625 0 .9382 -6.2433 0 -2.7945
  [4,15,-6.3686,0,-3.2171,-1.393,0,.8043,-1.625,0,.9382,-6.2433,0,-2.7945],
// 4 15 -.3982 0 7.1238 -.7029 0 6.796 -1.625 0 .9382 -1.393 0 .8043
  [4,15,-.3982,0,7.1238,-.7029,0,6.796,-1.625,0,.9382,-1.393,0,.8043],
// 4 15 -.3982 0 7.1238 -.9331 0 7.0885 -.8939 0 6.7911 -.7029 0 6.796
  [4,15,-.3982,0,7.1238,-.9331,0,7.0885,-.8939,0,6.7911,-.7029,0,6.796],
// 4 15 -1.8504 0 6.9062 -1.7728 0 6.6164 -.8939 0 6.7911 -.9331 0 7.0885
  [4,15,-1.8504,0,6.9062,-1.7728,0,6.6164,-.8939,0,6.7911,-.9331,0,7.0885],
// 4 15 -1.8504 0 6.9062 -2.7363 0 6.6059 -2.6215 0 6.3287 -1.7728 0 6.6164
  [4,15,-1.8504,0,6.9062,-2.7363,0,6.6059,-2.6215,0,6.3287,-1.7728,0,6.6164],
// 4 15 -3.575 0 6.1919 -3.425 0 5.9321 -2.6215 0 6.3287 -2.7363 0 6.6059
  [4,15,-3.575,0,6.1919,-3.425,0,5.9321,-2.6215,0,6.3287,-2.7363,0,6.6059],
// 4 15 -3.575 0 6.1919 -4.3529 0 5.6728 -4.1703 0 5.4348 -3.425 0 5.9321
  [4,15,-3.575,0,6.1919,-4.3529,0,5.6728,-4.1703,0,5.4348,-3.425,0,5.9321],
// 4 15 -5.0558 0 5.0558 -4.8436 0 4.8436 -4.1703 0 5.4348 -4.3529 0 5.6728
  [4,15,-5.0558,0,5.0558,-4.8436,0,4.8436,-4.1703,0,5.4348,-4.3529,0,5.6728],
// 4 15 -5.0558 0 5.0558 -5.6728 0 4.3529 -5.4348 0 4.1703 -4.8436 0 4.8436
  [4,15,-5.0558,0,5.0558,-5.6728,0,4.3529,-5.4348,0,4.1703,-4.8436,0,4.8436],
// 4 15 -6.1919 0 3.575 -5.9321 0 3.425 -5.4348 0 4.1703 -5.6728 0 4.3529
  [4,15,-6.1919,0,3.575,-5.9321,0,3.425,-5.4348,0,4.1703,-5.6728,0,4.3529],
// 4 15 -6.1919 0 3.575 -6.6059 0 2.7363 -6.3287 0 2.6215 -5.9321 0 3.425
  [4,15,-6.1919,0,3.575,-6.6059,0,2.7363,-6.3287,0,2.6215,-5.9321,0,3.425],
// 4 15 -6.9062 0 1.8504 -6.6164 0 1.7728 -6.3287 0 2.6215 -6.6059 0 2.7363
  [4,15,-6.9062,0,1.8504,-6.6164,0,1.7728,-6.3287,0,2.6215,-6.6059,0,2.7363],
// 4 15 -6.9062 0 1.8504 -7.0885 0 .9331 -6.7911 0 .8939 -6.6164 0 1.7728
  [4,15,-6.9062,0,1.8504,-7.0885,0,.9331,-6.7911,0,.8939,-6.6164,0,1.7728],
// 4 15 -7.15 0 0 -6.85 0 0 -6.7911 0 .8939 -7.0885 0 .9331
  [4,15,-7.15,0,0,-6.85,0,0,-6.7911,0,.8939,-7.0885,0,.9331],
// 4 15 5.9705 0 -3.9068 0 0 -1.6085 0 0 -1.8764 5.5419 0 -4.0097
  [4,15,5.9705,0,-3.9068,0,0,-1.6085,0,0,-1.8764,5.5419,0,-4.0097],
// 4 15 -5.9705 0 -3.9068 -5.5419 0 -4.0097 0 0 -1.8764 0 0 -1.6085
  [4,15,-5.9705,0,-3.9068,-5.5419,0,-4.0097,0,0,-1.8764,0,0,-1.6085],
// 4 15 -5.9705 0 -3.9068 -5.6728 0 -4.3529 -5.4348 0 -4.1703 -5.5419 0 -4.0097
  [4,15,-5.9705,0,-3.9068,-5.6728,0,-4.3529,-5.4348,0,-4.1703,-5.5419,0,-4.0097],
// 4 15 -5.0558 0 -5.0558 -4.8436 0 -4.8436 -5.4348 0 -4.1703 -5.6728 0 -4.3529
  [4,15,-5.0558,0,-5.0558,-4.8436,0,-4.8436,-5.4348,0,-4.1703,-5.6728,0,-4.3529],
// 4 15 -5.0558 0 -5.0558 -4.3529 0 -5.6728 -4.1703 0 -5.4348 -4.8436 0 -4.8436
  [4,15,-5.0558,0,-5.0558,-4.3529,0,-5.6728,-4.1703,0,-5.4348,-4.8436,0,-4.8436],
// 4 15 -3.575 0 -6.1919 -3.425 0 -5.9321 -4.1703 0 -5.4348 -4.3529 0 -5.6728
  [4,15,-3.575,0,-6.1919,-3.425,0,-5.9321,-4.1703,0,-5.4348,-4.3529,0,-5.6728],
// 4 15 -3.575 0 -6.1919 -2.7363 0 -6.6059 -2.6215 0 -6.3287 -3.425 0 -5.9321
  [4,15,-3.575,0,-6.1919,-2.7363,0,-6.6059,-2.6215,0,-6.3287,-3.425,0,-5.9321],
// 4 15 -1.8504 0 -6.9062 -1.7728 0 -6.6164 -2.6215 0 -6.3287 -2.7363 0 -6.6059
  [4,15,-1.8504,0,-6.9062,-1.7728,0,-6.6164,-2.6215,0,-6.3287,-2.7363,0,-6.6059],
// 4 15 -1.8504 0 -6.9062 -.9331 0 -7.0885 -.8939 0 -6.7911 -1.7728 0 -6.6164
  [4,15,-1.8504,0,-6.9062,-.9331,0,-7.0885,-.8939,0,-6.7911,-1.7728,0,-6.6164],
// 4 15 0 0 -7.15 0 0 -6.85 -.8939 0 -6.7911 -.9331 0 -7.0885
  [4,15,0,0,-7.15,0,0,-6.85,-.8939,0,-6.7911,-.9331,0,-7.0885],
// 0 // Neutral disc
// 4 16 1.625 0 .9382 6.2433 0 -2.7945 6.3287 0 -2.6215 6.6164 0 -1.7728
  [4,16,1.625,0,.9382,6.2433,0,-2.7945,6.3287,0,-2.6215,6.6164,0,-1.7728],
// 4 16 1.625 0 .9382 6.6164 0 -1.7728 6.7911 0 -.8939 6.85 0 0
  [4,16,1.625,0,.9382,6.6164,0,-1.7728,6.7911,0,-.8939,6.85,0,0],
// 4 16 1.625 0 .9382 6.85 0 0 6.7911 0 .8939 6.6164 0 1.7728
  [4,16,1.625,0,.9382,6.85,0,0,6.7911,0,.8939,6.6164,0,1.7728],
// 4 16 1.625 0 .9382 6.6164 0 1.7728 6.3287 0 2.6215 5.9321 0 3.425
  [4,16,1.625,0,.9382,6.6164,0,1.7728,6.3287,0,2.6215,5.9321,0,3.425],
// 4 16 1.625 0 .9382 5.9321 0 3.425 5.4348 0 4.1703 4.8436 0 4.8436
  [4,16,1.625,0,.9382,5.9321,0,3.425,5.4348,0,4.1703,4.8436,0,4.8436],
// 4 16 1.625 0 .9382 4.8436 0 4.8436 4.1703 0 5.4348 3.425 0 5.9321
  [4,16,1.625,0,.9382,4.8436,0,4.8436,4.1703,0,5.4348,3.425,0,5.9321],
// 4 16 1.625 0 .9382 3.425 0 5.9321 2.6215 0 6.3287 1.7728 0 6.6164
  [4,16,1.625,0,.9382,3.425,0,5.9321,2.6215,0,6.3287,1.7728,0,6.6164],
// 4 16 1.625 0 .9382 1.7728 0 6.6164 .8939 0 6.7911 .7029 0 6.796
  [4,16,1.625,0,.9382,1.7728,0,6.6164,.8939,0,6.7911,.7029,0,6.796],
// 4 16 -1.625 0 .9382 -.7029 0 6.796 -.8939 0 6.7911 -1.7728 0 6.6164
  [4,16,-1.625,0,.9382,-.7029,0,6.796,-.8939,0,6.7911,-1.7728,0,6.6164],
// 4 16 -1.625 0 .9382 -1.7728 0 6.6164 -2.6215 0 6.3287 -3.425 0 5.9321
  [4,16,-1.625,0,.9382,-1.7728,0,6.6164,-2.6215,0,6.3287,-3.425,0,5.9321],
// 4 16 -1.625 0 .9382 -3.425 0 5.9321 -4.1703 0 5.4348 -4.8436 0 4.8436
  [4,16,-1.625,0,.9382,-3.425,0,5.9321,-4.1703,0,5.4348,-4.8436,0,4.8436],
// 4 16 -1.625 0 .9382 -4.8436 0 4.8436 -5.4348 0 4.1703 -5.9321 0 3.425
  [4,16,-1.625,0,.9382,-4.8436,0,4.8436,-5.4348,0,4.1703,-5.9321,0,3.425],
// 4 16 -1.625 0 .9382 -5.9321 0 3.425 -6.3287 0 2.6215 -6.6164 0 1.7728
  [4,16,-1.625,0,.9382,-5.9321,0,3.425,-6.3287,0,2.6215,-6.6164,0,1.7728],
// 4 16 -1.625 0 .9382 -6.6164 0 1.7728 -6.7911 0 .8939 -6.85 0 0
  [4,16,-1.625,0,.9382,-6.6164,0,1.7728,-6.7911,0,.8939,-6.85,0,0],
// 4 16 -1.625 0 .9382 -6.85 0 0 -6.7911 0 -.8939 -6.6164 0 -1.7728
  [4,16,-1.625,0,.9382,-6.85,0,0,-6.7911,0,-.8939,-6.6164,0,-1.7728],
// 4 16 -1.625 0 .9382 -6.6164 0 -1.7728 -6.3287 0 -2.6215 -6.2433 0 -2.7945
  [4,16,-1.625,0,.9382,-6.6164,0,-1.7728,-6.3287,0,-2.6215,-6.2433,0,-2.7945],
// 4 16 0 0 -1.8764 -5.5419 0 -4.0097 -5.4348 0 -4.1703 -4.8436 0 -4.8436
  [4,16,0,0,-1.8764,-5.5419,0,-4.0097,-5.4348,0,-4.1703,-4.8436,0,-4.8436],
// 4 16 0 0 -1.8764 -4.8436 0 -4.8436 -4.1703 0 -5.4348 -3.425 0 -5.9321
  [4,16,0,0,-1.8764,-4.8436,0,-4.8436,-4.1703,0,-5.4348,-3.425,0,-5.9321],
// 4 16 0 0 -1.8764 -3.425 0 -5.9321 -2.6215 0 -6.3287 -1.7728 0 -6.6164
  [4,16,0,0,-1.8764,-3.425,0,-5.9321,-2.6215,0,-6.3287,-1.7728,0,-6.6164],
// 4 16 0 0 -1.8764 -1.7728 0 -6.6164 -.8939 0 -6.7911 0 0 -6.85
  [4,16,0,0,-1.8764,-1.7728,0,-6.6164,-.8939,0,-6.7911,0,0,-6.85],
// 4 16 0 0 -1.8764 0 0 -6.85 .8939 0 -6.7911 1.7728 0 -6.6164
  [4,16,0,0,-1.8764,0,0,-6.85,.8939,0,-6.7911,1.7728,0,-6.6164],
// 4 16 0 0 -1.8764 1.7728 0 -6.6164 2.6215 0 -6.3287 3.425 0 -5.9321
  [4,16,0,0,-1.8764,1.7728,0,-6.6164,2.6215,0,-6.3287,3.425,0,-5.9321],
// 4 16 0 0 -1.8764 3.425 0 -5.9321 4.1703 0 -5.4348 4.8436 0 -4.8436
  [4,16,0,0,-1.8764,3.425,0,-5.9321,4.1703,0,-5.4348,4.8436,0,-4.8436],
// 4 16 0 0 -1.8764 4.8436 0 -4.8436 5.4348 0 -4.1703 5.5419 0 -4.0097
  [4,16,0,0,-1.8764,4.8436,0,-4.8436,5.4348,0,-4.1703,5.5419,0,-4.0097],
// 0 // White lines of star
// 4 15 0 0 7.3 -.1213 0 7.275 -1.1188 0 .9382 -.3065 0 .257
  [4,15,0,0,7.3,-.1213,0,7.275,-1.1188,0,.9382,-.3065,0,.257],
// 3 15 0 0 7.3 -.3065 0 .257 0 0 0
  [3,15,0,0,7.3,-.3065,0,.257,0,0,0],
// 4 15 -.3758 0 .1369 -.3464 0 -.2 0 0 0 -.3065 0 .257
  [4,15,-.3758,0,.1369,-.3464,0,-.2,0,0,0,-.3065,0,.257],
// 4 15 -.3758 0 .1369 -1.3719 0 .4998 -6.361 0 -3.5325 -6.322 0 -3.65
  [4,15,-.3758,0,.1369,-1.3719,0,.4998,-6.361,0,-3.5325,-6.322,0,-3.65],
// 3 15 -.3758 0 .1369 -6.322 0 -3.65 -.3464 0 -.2
  [3,15,-.3758,0,.1369,-6.322,0,-3.65,-.3464,0,-.2],
// 4 15 .3464 0 -.2 -.3464 0 -.2 -.075 0 -.9 .075 0 -.9
  [4,15,.3464,0,-.2,-.3464,0,-.2,-.075,0,-.9,.075,0,-.9],
// 4 15 .3464 0 -.2 6.322 0 -3.65 6.361 0 -3.5325 1.3719 0 .4998
  [4,15,.3464,0,-.2,6.322,0,-3.65,6.361,0,-3.5325,1.3719,0,.4998],
// 4 15 .3464 0 -.2 1.3719 0 .4998 0 0 0 -.3464 0 -.2
  [4,15,.3464,0,-.2,1.3719,0,.4998,0,0,0,-.3464,0,-.2],
// 0 // Neutral lines of star
// 4 16 1.393 0 .8043 1.3719 0 .4998 6.361 0 -3.5325 6.3686 0 -3.2171
  [4,16,1.393,0,.8043,1.3719,0,.4998,6.361,0,-3.5325,6.3686,0,-3.2171],
// 3 16 1.393 0 .8043 0 0 0 1.3719 0 .4998
  [3,16,1.393,0,.8043,0,0,0,1.3719,0,.4998],
// 4 16 1.393 0 .8043 .3982 0 7.1238 0 0 7.3 0 0 0
  [4,16,1.393,0,.8043,.3982,0,7.1238,0,0,7.3,0,0,0],
// 4 16 -1.393 0 .8043 -1.1188 0 .9382 -.1213 0 7.275 -.3982 0 7.1238
  [4,16,-1.393,0,.8043,-1.1188,0,.9382,-.1213,0,7.275,-.3982,0,7.1238],
// 3 16 -1.393 0 .8043 -.3065 0 .257 -1.1188 0 .9382
  [3,16,-1.393,0,.8043,-.3065,0,.257,-1.1188,0,.9382],
// 4 16 -1.393 0 .8043 -1.3719 0 .4998 -.3758 0 .1369 -.3065 0 .257
  [4,16,-1.393,0,.8043,-1.3719,0,.4998,-.3758,0,.1369,-.3065,0,.257],
// 4 16 -1.393 0 .8043 -6.3686 0 -3.2171 -6.361 0 -3.5325 -1.3719 0 .4998
  [4,16,-1.393,0,.8043,-6.3686,0,-3.2171,-6.361,0,-3.5325,-1.3719,0,.4998],
// 3 16 -.075 0 -.9 -.3464 0 -.2 -6.322 0 -3.65
  [3,16,-.075,0,-.9,-.3464,0,-.2,-6.322,0,-3.65],
// 4 16 -.075 0 -.9 -6.322 0 -3.65 -5.9705 0 -3.9068 0 0 -1.6085
  [4,16,-.075,0,-.9,-6.322,0,-3.65,-5.9705,0,-3.9068,0,0,-1.6085],
// 4 16 .075 0 -.9 -.075 0 -.9 0 0 -1.6085 5.9705 0 -3.9068
  [4,16,.075,0,-.9,-.075,0,-.9,0,0,-1.6085,5.9705,0,-3.9068],
// 4 16 .075 0 -.9 5.9705 0 -3.9068 6.322 0 -3.65 .3464 0 -.2
  [4,16,.075,0,-.9,5.9705,0,-3.9068,6.322,0,-3.65,.3464,0,-.2],
// 4 16 6.5383 0 -3.775 6.322 0 -3.65 5.9705 0 -3.9068 6.2835 0 -3.9664
  [4,16,6.5383,0,-3.775,6.322,0,-3.65,5.9705,0,-3.9068,6.2835,0,-3.9664],
// 3 16 6.5383 0 -3.775 6.361 0 -3.5325 6.322 0 -3.65
  [3,16,6.5383,0,-3.775,6.361,0,-3.5325,6.322,0,-3.65],
// 4 16 6.5383 0 -3.775 6.5768 0 -3.4585 6.3686 0 -3.2171 6.361 0 -3.5325
  [4,16,6.5383,0,-3.775,6.5768,0,-3.4585,6.3686,0,-3.2171,6.361,0,-3.5325],
];
module ldraw_lib__24246p04(step=0, col=false, unit=2/5, alt=false, line=0.2, solid=!$preview)
    makepoly(ldraw_lib__24246p04(solid), step=step, col=col, unit=unit, alt=alt, line=line, solid=solid);
ldraw_lib__24246p04(line=0.2);
